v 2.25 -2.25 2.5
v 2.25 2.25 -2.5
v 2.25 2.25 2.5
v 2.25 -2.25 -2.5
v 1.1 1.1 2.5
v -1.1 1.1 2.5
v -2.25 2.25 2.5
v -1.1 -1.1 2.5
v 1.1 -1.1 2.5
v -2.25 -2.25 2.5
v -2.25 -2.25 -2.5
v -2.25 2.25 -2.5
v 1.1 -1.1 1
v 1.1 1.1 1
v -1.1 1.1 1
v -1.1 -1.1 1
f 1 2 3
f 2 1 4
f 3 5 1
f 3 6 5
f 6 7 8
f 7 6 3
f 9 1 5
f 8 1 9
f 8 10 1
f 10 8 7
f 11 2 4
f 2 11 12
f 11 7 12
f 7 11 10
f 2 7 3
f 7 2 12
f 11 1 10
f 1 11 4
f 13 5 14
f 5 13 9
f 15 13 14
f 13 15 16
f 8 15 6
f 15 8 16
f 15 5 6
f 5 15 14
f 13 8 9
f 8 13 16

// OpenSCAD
// Adjust the inner and outer widths to your 3D-Printer.
// I used FlexPLA to print my prototype.

inner=2.2;
outer=4.5;
outerHeight=5;
innerHeight=1.5;

difference() {
  cube([outer, outer, outerHeight], center=true);

  translate([0,0,outerHeight/2-innerHeight/2])
  {
    cube([inner, inner, innerHeight],center=true);
  };
};
